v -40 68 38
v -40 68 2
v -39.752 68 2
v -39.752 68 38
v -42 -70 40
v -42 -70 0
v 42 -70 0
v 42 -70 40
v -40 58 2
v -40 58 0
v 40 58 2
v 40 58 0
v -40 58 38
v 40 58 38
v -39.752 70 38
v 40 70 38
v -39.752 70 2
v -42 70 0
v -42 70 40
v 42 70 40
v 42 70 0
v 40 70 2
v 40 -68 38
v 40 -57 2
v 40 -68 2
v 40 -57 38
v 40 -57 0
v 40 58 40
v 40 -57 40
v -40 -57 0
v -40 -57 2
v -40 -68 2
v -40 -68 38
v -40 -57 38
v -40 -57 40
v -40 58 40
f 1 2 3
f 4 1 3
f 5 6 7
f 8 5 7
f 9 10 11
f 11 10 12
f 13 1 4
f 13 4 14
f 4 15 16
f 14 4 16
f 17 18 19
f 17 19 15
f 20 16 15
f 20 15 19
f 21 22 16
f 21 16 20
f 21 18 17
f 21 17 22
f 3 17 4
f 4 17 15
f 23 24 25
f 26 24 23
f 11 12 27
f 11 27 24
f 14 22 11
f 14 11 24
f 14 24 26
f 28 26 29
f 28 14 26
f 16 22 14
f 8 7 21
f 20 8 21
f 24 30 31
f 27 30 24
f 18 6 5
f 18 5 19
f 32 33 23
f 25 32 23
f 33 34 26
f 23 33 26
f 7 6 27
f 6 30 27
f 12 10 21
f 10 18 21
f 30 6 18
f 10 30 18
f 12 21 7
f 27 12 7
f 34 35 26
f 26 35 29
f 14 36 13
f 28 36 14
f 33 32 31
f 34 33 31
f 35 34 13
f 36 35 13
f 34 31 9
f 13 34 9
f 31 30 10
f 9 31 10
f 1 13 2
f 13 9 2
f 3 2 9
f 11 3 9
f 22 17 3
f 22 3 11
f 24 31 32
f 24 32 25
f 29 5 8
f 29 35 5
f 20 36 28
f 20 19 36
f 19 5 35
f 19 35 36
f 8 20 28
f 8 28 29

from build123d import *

# Parameters (mm, degrees)
SKETCH_W        = 84
SKETCH_H        = 140
PAD_DEPTH       = 40
SKETCH001_W     = 80
SKETCH001_H     = 136
POCKET_DEPTH    = 36
SKETCH004_W     = 80
SKETCH004_H     = 115
POCKET003_DEPTH = 4
SKETCH005_W     = 79.75218
SKETCH005_H     = 36
POCKET004_DEPTH = 2
SKETCH006_W     = 80
SKETCH006_H     = 115
POCKET005_DEPTH = 2


with BuildPart() as part:
    # Sketch → Pad (new body)
    with BuildSketch(Plane.XY):
        Rectangle(SKETCH_W, SKETCH_H)
    extrude(amount=PAD_DEPTH)

    # Sketch001 → Pocket (cut)
    with BuildSketch(Plane.XY.offset(38)):
        Rectangle(SKETCH001_W, SKETCH001_H)
    extrude(amount=-POCKET_DEPTH, mode=Mode.SUBTRACT)

    # Sketch004 → Pocket003 (cut)
    with BuildSketch(Plane.XY):
        with Locations((0, 0.5)):
            Rectangle(SKETCH004_W, SKETCH004_H)
    extrude(amount=POCKET003_DEPTH, mode=Mode.SUBTRACT)

    # Sketch005 → Pocket004 (cut)
    with BuildSketch(Plane.XZ.offset(-70)):
        with Locations((0.12391, 20)):
            Rectangle(SKETCH005_W, SKETCH005_H)
    extrude(amount=POCKET004_DEPTH, mode=Mode.SUBTRACT)

    # Sketch006 → Pocket005 (cut)
    with BuildSketch(Plane.XY.offset(40)):
        with Locations((0, 0.5)):
            Rectangle(SKETCH006_W, SKETCH006_H)
    extrude(amount=-POCKET005_DEPTH, mode=Mode.SUBTRACT)


solid = part.part
